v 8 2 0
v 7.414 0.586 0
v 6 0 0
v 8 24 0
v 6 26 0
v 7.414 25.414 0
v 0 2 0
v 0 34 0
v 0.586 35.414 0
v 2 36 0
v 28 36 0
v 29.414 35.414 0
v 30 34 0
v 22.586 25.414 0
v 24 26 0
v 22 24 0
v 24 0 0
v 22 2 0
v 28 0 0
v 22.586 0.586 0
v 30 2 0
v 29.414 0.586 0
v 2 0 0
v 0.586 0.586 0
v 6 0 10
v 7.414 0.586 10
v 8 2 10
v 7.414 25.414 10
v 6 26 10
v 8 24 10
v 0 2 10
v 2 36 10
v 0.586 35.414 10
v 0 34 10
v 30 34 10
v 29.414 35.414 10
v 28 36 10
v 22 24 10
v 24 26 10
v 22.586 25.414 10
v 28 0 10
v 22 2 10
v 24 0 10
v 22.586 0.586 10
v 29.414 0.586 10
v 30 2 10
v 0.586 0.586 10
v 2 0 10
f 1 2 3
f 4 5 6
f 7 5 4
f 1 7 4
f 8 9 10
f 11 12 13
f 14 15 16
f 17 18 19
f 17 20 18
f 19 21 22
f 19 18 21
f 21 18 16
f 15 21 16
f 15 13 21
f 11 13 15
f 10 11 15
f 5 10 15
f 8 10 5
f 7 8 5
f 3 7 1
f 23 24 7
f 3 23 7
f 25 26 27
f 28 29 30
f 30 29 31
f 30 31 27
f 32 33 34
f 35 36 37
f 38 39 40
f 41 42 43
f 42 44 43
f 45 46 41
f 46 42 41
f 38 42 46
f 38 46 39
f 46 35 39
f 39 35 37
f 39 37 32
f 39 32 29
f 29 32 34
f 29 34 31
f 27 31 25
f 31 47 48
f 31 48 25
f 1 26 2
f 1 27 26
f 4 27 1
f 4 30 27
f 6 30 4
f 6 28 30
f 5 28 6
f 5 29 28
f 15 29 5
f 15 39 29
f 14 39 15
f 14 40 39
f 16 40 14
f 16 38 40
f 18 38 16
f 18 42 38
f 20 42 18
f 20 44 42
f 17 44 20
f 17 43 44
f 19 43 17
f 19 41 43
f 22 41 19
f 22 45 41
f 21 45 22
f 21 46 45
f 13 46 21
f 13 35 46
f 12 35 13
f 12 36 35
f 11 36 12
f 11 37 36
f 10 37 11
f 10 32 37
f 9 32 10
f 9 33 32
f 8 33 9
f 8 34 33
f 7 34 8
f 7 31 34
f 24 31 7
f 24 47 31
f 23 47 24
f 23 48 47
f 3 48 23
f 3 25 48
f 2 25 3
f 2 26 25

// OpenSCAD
$fn = 32;

// ----------------------------------------------------------------------
// Clip blank: staple clip, 10 mm thick
// ----------------------------------------------------------------------

// --- parameters (mm) ---
profile_height = 10;      // extrusion height
profile_points = 24;      // points of the closed outline

profile = [[0, 2], [0.586, 0.586], [2, 0], [6, 0], [7.414, 0.586], [8, 2], [8, 24], [7.414, 25.414], [6, 26], [24, 26], [22.586, 25.414], [22, 24], [22, 2], [22.586, 0.586], [24, 0], [28, 0], [29.414, 0.586], [30, 2], [30, 34], [29.414, 35.414], [28, 36], [2, 36], [0.586, 35.414], [0, 34]];  // single closed polygon, 24 points, counter clockwise

// --- the one profile operation ---
linear_extrude(height = profile_height) polygon(points = profile);
